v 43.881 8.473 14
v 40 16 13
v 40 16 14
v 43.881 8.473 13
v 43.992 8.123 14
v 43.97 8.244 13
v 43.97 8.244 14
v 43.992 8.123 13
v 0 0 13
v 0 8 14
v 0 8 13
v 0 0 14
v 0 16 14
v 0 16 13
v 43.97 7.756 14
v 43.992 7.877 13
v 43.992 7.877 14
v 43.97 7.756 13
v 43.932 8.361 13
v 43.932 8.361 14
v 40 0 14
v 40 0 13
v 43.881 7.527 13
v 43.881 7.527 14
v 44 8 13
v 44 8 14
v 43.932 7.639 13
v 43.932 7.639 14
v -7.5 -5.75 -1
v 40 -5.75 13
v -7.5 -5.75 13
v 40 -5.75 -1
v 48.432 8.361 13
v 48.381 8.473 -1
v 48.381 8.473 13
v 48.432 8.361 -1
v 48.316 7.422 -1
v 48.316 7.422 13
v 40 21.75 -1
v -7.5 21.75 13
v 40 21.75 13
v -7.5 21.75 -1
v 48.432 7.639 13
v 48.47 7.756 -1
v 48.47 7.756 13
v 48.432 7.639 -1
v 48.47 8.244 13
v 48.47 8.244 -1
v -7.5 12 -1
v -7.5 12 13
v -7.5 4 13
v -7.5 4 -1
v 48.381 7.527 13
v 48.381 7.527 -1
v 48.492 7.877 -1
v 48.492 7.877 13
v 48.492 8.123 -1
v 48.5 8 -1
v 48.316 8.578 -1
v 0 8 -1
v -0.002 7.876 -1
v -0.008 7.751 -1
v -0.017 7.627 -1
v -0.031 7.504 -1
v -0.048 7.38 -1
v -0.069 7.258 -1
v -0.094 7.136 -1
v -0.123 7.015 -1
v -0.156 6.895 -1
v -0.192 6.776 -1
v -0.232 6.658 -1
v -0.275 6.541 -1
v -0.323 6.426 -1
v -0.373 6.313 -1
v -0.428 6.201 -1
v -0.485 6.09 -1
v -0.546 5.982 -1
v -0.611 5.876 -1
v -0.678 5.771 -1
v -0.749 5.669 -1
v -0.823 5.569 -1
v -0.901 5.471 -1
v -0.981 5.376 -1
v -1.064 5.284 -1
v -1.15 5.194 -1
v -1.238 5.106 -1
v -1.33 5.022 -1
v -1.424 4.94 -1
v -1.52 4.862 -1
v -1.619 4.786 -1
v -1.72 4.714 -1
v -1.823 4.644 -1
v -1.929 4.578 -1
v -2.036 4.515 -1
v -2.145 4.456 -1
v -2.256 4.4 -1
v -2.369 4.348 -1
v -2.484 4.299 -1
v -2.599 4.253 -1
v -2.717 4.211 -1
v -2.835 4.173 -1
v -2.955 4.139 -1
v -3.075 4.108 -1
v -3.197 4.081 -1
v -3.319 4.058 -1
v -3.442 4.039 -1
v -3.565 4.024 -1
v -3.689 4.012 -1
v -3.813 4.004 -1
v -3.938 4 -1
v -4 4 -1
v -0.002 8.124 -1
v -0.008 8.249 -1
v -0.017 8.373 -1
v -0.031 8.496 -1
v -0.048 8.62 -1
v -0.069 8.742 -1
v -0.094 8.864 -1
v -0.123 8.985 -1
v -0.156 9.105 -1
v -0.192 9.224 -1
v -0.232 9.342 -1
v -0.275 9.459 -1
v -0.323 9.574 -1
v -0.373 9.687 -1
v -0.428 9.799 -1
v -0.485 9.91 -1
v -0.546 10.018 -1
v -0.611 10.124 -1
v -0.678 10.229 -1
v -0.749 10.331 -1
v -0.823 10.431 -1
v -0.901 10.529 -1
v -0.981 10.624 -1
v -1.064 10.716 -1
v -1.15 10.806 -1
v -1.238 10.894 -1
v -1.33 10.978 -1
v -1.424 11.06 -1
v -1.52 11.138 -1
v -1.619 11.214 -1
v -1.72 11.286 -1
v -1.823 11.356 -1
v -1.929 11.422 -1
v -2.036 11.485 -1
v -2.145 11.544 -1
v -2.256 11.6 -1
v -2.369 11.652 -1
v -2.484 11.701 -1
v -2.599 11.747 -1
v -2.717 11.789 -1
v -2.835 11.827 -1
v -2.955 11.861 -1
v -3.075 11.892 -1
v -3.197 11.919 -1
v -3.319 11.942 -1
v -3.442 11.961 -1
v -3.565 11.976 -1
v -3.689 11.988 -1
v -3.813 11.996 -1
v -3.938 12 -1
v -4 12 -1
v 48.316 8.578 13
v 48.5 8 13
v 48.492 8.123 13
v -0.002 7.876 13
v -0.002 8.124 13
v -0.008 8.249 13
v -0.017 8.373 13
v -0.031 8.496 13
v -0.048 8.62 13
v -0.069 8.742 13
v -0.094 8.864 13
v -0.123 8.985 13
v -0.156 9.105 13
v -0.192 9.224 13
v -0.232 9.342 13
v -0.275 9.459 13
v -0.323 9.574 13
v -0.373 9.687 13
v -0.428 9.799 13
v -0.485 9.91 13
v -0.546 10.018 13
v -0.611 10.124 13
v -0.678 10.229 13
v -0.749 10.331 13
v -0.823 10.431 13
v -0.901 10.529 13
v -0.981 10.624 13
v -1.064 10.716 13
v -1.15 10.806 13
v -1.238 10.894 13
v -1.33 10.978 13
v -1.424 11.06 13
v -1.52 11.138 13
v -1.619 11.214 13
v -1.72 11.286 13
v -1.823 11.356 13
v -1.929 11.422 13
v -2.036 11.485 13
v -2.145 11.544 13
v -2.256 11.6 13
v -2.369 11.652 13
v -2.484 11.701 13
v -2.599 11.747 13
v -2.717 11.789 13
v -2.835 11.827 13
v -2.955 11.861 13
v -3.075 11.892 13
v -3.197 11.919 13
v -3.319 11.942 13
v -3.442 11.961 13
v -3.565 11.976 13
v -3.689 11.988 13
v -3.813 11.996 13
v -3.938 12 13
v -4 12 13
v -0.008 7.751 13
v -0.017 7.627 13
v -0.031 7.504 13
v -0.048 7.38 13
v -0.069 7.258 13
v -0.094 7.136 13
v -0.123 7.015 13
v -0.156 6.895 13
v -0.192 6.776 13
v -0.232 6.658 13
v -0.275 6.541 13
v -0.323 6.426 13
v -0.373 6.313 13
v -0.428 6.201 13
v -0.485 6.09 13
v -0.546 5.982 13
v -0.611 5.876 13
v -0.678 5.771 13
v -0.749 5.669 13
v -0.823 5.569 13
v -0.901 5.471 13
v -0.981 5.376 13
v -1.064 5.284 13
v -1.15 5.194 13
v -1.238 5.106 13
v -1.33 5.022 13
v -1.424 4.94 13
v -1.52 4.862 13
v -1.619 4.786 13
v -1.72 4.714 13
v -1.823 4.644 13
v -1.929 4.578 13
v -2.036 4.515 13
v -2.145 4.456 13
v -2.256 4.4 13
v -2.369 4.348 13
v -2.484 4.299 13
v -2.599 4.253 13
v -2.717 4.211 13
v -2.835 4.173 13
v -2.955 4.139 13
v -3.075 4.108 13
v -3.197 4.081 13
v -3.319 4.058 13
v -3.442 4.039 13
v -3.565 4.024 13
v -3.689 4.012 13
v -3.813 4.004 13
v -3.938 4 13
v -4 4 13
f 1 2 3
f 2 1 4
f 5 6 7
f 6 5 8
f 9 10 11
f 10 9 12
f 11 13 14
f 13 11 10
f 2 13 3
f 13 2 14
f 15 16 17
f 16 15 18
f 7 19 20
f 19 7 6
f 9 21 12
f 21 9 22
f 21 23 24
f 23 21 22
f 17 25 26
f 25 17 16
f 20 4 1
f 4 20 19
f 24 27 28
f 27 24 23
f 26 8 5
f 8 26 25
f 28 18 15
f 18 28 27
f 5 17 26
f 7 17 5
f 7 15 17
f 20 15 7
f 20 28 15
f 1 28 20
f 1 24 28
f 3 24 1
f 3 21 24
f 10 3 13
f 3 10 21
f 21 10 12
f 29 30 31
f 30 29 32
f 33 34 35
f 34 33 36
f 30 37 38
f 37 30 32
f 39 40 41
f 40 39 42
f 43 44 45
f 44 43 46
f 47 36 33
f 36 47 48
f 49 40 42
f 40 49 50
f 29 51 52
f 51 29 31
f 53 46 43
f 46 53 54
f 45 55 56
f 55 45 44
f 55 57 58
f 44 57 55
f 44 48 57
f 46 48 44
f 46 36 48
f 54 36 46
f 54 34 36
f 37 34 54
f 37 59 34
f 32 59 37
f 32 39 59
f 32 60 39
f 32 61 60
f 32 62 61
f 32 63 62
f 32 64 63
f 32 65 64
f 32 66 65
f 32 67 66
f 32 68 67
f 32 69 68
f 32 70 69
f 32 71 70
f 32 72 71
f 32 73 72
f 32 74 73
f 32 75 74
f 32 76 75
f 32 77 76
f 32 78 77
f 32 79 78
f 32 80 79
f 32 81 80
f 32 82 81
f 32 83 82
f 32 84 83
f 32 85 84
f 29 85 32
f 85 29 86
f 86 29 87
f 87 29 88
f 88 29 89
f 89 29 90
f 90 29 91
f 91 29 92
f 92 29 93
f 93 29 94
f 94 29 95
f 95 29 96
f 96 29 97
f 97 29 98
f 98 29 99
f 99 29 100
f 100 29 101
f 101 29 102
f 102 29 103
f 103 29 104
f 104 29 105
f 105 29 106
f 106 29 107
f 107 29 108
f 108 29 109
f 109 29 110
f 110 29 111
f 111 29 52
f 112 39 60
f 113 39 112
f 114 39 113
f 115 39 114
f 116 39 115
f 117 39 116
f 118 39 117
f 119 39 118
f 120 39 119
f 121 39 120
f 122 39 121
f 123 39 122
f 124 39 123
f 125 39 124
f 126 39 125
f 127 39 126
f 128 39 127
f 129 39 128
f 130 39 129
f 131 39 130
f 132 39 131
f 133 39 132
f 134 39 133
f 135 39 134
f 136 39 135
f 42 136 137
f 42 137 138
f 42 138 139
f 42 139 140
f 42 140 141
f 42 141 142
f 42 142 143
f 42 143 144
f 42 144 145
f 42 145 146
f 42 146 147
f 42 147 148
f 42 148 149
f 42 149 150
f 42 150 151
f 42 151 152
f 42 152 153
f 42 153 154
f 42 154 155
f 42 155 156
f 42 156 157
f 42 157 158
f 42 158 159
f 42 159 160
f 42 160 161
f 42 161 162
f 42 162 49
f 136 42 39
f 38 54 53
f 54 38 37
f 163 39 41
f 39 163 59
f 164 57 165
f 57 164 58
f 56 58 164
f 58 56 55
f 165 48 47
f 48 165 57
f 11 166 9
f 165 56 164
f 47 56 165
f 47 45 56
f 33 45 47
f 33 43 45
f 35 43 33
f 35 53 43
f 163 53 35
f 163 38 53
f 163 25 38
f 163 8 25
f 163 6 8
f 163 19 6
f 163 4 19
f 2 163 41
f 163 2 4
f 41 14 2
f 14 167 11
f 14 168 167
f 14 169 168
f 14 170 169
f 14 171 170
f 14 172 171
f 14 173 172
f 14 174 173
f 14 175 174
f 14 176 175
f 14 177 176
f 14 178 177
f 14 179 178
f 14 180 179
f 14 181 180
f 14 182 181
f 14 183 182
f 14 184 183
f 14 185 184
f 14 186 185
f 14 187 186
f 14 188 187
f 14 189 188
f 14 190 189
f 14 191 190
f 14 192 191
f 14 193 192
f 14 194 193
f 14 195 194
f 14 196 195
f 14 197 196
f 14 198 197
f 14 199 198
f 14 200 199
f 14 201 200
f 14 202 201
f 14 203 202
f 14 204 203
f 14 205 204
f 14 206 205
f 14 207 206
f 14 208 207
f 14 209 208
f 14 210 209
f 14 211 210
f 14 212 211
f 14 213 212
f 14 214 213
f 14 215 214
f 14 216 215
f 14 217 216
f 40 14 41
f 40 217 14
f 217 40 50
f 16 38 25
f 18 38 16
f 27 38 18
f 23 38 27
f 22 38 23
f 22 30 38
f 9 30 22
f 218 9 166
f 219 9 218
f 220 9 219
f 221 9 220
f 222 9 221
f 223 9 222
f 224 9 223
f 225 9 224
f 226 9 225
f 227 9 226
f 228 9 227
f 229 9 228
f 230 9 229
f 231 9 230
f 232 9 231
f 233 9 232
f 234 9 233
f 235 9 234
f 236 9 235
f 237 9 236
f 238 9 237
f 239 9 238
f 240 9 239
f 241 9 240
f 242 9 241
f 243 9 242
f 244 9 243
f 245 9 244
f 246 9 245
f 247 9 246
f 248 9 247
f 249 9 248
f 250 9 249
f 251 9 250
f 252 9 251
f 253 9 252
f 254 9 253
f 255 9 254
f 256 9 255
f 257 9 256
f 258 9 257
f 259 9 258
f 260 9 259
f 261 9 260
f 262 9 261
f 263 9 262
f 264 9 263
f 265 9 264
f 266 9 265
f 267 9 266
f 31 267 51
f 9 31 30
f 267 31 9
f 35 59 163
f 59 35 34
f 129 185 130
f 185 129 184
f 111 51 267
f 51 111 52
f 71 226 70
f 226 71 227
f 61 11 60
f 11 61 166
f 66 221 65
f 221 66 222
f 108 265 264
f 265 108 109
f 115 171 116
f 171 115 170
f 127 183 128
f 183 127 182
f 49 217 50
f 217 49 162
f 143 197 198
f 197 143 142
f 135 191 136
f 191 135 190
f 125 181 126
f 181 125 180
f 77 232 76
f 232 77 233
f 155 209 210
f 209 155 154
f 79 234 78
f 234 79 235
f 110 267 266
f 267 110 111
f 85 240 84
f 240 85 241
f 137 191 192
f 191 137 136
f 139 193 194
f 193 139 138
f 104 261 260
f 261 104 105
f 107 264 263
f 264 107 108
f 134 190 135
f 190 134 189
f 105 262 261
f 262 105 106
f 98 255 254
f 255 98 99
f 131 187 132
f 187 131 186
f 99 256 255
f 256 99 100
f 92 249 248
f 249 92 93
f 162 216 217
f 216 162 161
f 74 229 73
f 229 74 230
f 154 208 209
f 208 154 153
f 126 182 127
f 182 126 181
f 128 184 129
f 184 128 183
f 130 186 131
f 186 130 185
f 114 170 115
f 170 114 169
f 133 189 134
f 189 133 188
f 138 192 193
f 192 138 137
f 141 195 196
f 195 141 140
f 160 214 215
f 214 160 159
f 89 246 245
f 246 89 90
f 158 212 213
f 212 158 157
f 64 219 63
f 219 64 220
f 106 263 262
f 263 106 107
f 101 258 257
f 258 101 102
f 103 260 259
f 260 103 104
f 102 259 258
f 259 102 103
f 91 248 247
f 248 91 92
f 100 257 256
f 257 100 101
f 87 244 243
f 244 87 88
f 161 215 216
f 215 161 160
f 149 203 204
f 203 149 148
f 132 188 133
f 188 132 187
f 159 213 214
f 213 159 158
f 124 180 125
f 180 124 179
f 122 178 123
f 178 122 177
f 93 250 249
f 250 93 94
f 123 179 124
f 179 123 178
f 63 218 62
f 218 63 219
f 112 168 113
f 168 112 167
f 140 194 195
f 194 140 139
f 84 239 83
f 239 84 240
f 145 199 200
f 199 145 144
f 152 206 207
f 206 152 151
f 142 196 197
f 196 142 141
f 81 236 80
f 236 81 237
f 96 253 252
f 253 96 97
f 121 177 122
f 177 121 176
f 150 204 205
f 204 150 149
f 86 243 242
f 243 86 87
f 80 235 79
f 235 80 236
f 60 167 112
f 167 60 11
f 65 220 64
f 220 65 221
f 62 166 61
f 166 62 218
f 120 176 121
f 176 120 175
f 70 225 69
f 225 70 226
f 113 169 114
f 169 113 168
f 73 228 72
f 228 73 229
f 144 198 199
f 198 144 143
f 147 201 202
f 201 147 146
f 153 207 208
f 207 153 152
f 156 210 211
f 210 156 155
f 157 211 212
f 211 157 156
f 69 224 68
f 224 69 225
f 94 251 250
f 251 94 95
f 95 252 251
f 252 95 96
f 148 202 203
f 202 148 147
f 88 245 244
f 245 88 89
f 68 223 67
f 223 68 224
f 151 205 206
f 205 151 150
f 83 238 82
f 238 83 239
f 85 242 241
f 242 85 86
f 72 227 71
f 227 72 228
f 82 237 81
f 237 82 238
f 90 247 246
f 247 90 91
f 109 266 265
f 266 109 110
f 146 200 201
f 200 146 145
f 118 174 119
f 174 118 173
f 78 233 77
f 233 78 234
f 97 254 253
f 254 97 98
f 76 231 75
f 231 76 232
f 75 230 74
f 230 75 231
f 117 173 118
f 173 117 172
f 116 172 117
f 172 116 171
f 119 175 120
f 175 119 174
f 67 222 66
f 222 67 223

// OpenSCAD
inner_width = 40;
top_height = 14;
bottom_height = 10;
inner_depth = 16;
inner_point_offset = 3;
inner_point_diameter = 2;

connector_gap = 8;

point_offset = 7.5;
point_diameter =  2;
width = 47.5;
depth = 27.5;

gap = 1;

wiper_width = 14;
wiper_depth = 16;
wiper_thickness = 5;
wiper_inset = 4;
wiper_gap = 3;

$fs = .125;
$fa = .125;

top_guard();
//wiper();

module wiper() {
    difference() {
        cube([wiper_width, wiper_depth, wiper_thickness]);
        hull() {
            translate([wiper_width/2-wiper_gap/2, -1, -1]) cube([wiper_gap, wiper_inset+1, wiper_thickness+2]);
            translate([wiper_width/2, wiper_inset, -1]) cylinder(r=wiper_gap/2, h=wiper_thickness+2);
        }
    }
}


module top_guard() {
    difference() {
        union() {
            hull() {
                cube([inner_width,inner_depth,top_height]);
                 translate([inner_width+inner_point_offset, inner_depth/2, 0]) cylinder(r=inner_point_diameter/2,h=top_height);   
            }
            hull() {
                translate([-(width-inner_width), -(depth-inner_depth)/2, -gap]) cube([width, depth, top_height]);
                 translate([inner_width+point_offset, inner_depth/2, -gap]) cylinder(r=inner_point_diameter/2,h=top_height);   
            }
        }
        hull() {
            translate([-(width-inner_width)-1, (inner_depth-connector_gap)/2, -gap-1]) cube([width-inner_width-connector_gap/2+1, connector_gap, top_height+2]);
            translate([-connector_gap/2, inner_depth/2, -gap]) cylinder(r=connector_gap/2,h=top_height+2);   

        }
    }
}

module bottom_guard() {
    difference() {
        union() {
            hull() {
                cube([inner_width,inner_depth,top_height]);
                 translate([inner_width+inner_point_offset, inner_depth/2, 0]) cylinder(r=inner_point_diameter/2,h=top_height);   
            }
            hull() {
                translate([-(width-inner_width), -(depth-inner_depth)/2, -gap]) cube([width, depth, top_height]);
                 translate([inner_width+point_offset, inner_depth/2, -gap]) cylinder(r=inner_point_diameter/2,h=top_height);   
            }
        }
        hull() {
            translate([-(width-inner_width)-1, (inner_depth-connector_gap)/2, -gap-1]) cube([width-inner_width-connector_gap/2+1, connector_gap, top_height+2]);
            translate([-connector_gap/2, inner_depth/2, -gap]) cylinder(r=connector_gap/2,h=top_height+2);   

        }
    }
}
